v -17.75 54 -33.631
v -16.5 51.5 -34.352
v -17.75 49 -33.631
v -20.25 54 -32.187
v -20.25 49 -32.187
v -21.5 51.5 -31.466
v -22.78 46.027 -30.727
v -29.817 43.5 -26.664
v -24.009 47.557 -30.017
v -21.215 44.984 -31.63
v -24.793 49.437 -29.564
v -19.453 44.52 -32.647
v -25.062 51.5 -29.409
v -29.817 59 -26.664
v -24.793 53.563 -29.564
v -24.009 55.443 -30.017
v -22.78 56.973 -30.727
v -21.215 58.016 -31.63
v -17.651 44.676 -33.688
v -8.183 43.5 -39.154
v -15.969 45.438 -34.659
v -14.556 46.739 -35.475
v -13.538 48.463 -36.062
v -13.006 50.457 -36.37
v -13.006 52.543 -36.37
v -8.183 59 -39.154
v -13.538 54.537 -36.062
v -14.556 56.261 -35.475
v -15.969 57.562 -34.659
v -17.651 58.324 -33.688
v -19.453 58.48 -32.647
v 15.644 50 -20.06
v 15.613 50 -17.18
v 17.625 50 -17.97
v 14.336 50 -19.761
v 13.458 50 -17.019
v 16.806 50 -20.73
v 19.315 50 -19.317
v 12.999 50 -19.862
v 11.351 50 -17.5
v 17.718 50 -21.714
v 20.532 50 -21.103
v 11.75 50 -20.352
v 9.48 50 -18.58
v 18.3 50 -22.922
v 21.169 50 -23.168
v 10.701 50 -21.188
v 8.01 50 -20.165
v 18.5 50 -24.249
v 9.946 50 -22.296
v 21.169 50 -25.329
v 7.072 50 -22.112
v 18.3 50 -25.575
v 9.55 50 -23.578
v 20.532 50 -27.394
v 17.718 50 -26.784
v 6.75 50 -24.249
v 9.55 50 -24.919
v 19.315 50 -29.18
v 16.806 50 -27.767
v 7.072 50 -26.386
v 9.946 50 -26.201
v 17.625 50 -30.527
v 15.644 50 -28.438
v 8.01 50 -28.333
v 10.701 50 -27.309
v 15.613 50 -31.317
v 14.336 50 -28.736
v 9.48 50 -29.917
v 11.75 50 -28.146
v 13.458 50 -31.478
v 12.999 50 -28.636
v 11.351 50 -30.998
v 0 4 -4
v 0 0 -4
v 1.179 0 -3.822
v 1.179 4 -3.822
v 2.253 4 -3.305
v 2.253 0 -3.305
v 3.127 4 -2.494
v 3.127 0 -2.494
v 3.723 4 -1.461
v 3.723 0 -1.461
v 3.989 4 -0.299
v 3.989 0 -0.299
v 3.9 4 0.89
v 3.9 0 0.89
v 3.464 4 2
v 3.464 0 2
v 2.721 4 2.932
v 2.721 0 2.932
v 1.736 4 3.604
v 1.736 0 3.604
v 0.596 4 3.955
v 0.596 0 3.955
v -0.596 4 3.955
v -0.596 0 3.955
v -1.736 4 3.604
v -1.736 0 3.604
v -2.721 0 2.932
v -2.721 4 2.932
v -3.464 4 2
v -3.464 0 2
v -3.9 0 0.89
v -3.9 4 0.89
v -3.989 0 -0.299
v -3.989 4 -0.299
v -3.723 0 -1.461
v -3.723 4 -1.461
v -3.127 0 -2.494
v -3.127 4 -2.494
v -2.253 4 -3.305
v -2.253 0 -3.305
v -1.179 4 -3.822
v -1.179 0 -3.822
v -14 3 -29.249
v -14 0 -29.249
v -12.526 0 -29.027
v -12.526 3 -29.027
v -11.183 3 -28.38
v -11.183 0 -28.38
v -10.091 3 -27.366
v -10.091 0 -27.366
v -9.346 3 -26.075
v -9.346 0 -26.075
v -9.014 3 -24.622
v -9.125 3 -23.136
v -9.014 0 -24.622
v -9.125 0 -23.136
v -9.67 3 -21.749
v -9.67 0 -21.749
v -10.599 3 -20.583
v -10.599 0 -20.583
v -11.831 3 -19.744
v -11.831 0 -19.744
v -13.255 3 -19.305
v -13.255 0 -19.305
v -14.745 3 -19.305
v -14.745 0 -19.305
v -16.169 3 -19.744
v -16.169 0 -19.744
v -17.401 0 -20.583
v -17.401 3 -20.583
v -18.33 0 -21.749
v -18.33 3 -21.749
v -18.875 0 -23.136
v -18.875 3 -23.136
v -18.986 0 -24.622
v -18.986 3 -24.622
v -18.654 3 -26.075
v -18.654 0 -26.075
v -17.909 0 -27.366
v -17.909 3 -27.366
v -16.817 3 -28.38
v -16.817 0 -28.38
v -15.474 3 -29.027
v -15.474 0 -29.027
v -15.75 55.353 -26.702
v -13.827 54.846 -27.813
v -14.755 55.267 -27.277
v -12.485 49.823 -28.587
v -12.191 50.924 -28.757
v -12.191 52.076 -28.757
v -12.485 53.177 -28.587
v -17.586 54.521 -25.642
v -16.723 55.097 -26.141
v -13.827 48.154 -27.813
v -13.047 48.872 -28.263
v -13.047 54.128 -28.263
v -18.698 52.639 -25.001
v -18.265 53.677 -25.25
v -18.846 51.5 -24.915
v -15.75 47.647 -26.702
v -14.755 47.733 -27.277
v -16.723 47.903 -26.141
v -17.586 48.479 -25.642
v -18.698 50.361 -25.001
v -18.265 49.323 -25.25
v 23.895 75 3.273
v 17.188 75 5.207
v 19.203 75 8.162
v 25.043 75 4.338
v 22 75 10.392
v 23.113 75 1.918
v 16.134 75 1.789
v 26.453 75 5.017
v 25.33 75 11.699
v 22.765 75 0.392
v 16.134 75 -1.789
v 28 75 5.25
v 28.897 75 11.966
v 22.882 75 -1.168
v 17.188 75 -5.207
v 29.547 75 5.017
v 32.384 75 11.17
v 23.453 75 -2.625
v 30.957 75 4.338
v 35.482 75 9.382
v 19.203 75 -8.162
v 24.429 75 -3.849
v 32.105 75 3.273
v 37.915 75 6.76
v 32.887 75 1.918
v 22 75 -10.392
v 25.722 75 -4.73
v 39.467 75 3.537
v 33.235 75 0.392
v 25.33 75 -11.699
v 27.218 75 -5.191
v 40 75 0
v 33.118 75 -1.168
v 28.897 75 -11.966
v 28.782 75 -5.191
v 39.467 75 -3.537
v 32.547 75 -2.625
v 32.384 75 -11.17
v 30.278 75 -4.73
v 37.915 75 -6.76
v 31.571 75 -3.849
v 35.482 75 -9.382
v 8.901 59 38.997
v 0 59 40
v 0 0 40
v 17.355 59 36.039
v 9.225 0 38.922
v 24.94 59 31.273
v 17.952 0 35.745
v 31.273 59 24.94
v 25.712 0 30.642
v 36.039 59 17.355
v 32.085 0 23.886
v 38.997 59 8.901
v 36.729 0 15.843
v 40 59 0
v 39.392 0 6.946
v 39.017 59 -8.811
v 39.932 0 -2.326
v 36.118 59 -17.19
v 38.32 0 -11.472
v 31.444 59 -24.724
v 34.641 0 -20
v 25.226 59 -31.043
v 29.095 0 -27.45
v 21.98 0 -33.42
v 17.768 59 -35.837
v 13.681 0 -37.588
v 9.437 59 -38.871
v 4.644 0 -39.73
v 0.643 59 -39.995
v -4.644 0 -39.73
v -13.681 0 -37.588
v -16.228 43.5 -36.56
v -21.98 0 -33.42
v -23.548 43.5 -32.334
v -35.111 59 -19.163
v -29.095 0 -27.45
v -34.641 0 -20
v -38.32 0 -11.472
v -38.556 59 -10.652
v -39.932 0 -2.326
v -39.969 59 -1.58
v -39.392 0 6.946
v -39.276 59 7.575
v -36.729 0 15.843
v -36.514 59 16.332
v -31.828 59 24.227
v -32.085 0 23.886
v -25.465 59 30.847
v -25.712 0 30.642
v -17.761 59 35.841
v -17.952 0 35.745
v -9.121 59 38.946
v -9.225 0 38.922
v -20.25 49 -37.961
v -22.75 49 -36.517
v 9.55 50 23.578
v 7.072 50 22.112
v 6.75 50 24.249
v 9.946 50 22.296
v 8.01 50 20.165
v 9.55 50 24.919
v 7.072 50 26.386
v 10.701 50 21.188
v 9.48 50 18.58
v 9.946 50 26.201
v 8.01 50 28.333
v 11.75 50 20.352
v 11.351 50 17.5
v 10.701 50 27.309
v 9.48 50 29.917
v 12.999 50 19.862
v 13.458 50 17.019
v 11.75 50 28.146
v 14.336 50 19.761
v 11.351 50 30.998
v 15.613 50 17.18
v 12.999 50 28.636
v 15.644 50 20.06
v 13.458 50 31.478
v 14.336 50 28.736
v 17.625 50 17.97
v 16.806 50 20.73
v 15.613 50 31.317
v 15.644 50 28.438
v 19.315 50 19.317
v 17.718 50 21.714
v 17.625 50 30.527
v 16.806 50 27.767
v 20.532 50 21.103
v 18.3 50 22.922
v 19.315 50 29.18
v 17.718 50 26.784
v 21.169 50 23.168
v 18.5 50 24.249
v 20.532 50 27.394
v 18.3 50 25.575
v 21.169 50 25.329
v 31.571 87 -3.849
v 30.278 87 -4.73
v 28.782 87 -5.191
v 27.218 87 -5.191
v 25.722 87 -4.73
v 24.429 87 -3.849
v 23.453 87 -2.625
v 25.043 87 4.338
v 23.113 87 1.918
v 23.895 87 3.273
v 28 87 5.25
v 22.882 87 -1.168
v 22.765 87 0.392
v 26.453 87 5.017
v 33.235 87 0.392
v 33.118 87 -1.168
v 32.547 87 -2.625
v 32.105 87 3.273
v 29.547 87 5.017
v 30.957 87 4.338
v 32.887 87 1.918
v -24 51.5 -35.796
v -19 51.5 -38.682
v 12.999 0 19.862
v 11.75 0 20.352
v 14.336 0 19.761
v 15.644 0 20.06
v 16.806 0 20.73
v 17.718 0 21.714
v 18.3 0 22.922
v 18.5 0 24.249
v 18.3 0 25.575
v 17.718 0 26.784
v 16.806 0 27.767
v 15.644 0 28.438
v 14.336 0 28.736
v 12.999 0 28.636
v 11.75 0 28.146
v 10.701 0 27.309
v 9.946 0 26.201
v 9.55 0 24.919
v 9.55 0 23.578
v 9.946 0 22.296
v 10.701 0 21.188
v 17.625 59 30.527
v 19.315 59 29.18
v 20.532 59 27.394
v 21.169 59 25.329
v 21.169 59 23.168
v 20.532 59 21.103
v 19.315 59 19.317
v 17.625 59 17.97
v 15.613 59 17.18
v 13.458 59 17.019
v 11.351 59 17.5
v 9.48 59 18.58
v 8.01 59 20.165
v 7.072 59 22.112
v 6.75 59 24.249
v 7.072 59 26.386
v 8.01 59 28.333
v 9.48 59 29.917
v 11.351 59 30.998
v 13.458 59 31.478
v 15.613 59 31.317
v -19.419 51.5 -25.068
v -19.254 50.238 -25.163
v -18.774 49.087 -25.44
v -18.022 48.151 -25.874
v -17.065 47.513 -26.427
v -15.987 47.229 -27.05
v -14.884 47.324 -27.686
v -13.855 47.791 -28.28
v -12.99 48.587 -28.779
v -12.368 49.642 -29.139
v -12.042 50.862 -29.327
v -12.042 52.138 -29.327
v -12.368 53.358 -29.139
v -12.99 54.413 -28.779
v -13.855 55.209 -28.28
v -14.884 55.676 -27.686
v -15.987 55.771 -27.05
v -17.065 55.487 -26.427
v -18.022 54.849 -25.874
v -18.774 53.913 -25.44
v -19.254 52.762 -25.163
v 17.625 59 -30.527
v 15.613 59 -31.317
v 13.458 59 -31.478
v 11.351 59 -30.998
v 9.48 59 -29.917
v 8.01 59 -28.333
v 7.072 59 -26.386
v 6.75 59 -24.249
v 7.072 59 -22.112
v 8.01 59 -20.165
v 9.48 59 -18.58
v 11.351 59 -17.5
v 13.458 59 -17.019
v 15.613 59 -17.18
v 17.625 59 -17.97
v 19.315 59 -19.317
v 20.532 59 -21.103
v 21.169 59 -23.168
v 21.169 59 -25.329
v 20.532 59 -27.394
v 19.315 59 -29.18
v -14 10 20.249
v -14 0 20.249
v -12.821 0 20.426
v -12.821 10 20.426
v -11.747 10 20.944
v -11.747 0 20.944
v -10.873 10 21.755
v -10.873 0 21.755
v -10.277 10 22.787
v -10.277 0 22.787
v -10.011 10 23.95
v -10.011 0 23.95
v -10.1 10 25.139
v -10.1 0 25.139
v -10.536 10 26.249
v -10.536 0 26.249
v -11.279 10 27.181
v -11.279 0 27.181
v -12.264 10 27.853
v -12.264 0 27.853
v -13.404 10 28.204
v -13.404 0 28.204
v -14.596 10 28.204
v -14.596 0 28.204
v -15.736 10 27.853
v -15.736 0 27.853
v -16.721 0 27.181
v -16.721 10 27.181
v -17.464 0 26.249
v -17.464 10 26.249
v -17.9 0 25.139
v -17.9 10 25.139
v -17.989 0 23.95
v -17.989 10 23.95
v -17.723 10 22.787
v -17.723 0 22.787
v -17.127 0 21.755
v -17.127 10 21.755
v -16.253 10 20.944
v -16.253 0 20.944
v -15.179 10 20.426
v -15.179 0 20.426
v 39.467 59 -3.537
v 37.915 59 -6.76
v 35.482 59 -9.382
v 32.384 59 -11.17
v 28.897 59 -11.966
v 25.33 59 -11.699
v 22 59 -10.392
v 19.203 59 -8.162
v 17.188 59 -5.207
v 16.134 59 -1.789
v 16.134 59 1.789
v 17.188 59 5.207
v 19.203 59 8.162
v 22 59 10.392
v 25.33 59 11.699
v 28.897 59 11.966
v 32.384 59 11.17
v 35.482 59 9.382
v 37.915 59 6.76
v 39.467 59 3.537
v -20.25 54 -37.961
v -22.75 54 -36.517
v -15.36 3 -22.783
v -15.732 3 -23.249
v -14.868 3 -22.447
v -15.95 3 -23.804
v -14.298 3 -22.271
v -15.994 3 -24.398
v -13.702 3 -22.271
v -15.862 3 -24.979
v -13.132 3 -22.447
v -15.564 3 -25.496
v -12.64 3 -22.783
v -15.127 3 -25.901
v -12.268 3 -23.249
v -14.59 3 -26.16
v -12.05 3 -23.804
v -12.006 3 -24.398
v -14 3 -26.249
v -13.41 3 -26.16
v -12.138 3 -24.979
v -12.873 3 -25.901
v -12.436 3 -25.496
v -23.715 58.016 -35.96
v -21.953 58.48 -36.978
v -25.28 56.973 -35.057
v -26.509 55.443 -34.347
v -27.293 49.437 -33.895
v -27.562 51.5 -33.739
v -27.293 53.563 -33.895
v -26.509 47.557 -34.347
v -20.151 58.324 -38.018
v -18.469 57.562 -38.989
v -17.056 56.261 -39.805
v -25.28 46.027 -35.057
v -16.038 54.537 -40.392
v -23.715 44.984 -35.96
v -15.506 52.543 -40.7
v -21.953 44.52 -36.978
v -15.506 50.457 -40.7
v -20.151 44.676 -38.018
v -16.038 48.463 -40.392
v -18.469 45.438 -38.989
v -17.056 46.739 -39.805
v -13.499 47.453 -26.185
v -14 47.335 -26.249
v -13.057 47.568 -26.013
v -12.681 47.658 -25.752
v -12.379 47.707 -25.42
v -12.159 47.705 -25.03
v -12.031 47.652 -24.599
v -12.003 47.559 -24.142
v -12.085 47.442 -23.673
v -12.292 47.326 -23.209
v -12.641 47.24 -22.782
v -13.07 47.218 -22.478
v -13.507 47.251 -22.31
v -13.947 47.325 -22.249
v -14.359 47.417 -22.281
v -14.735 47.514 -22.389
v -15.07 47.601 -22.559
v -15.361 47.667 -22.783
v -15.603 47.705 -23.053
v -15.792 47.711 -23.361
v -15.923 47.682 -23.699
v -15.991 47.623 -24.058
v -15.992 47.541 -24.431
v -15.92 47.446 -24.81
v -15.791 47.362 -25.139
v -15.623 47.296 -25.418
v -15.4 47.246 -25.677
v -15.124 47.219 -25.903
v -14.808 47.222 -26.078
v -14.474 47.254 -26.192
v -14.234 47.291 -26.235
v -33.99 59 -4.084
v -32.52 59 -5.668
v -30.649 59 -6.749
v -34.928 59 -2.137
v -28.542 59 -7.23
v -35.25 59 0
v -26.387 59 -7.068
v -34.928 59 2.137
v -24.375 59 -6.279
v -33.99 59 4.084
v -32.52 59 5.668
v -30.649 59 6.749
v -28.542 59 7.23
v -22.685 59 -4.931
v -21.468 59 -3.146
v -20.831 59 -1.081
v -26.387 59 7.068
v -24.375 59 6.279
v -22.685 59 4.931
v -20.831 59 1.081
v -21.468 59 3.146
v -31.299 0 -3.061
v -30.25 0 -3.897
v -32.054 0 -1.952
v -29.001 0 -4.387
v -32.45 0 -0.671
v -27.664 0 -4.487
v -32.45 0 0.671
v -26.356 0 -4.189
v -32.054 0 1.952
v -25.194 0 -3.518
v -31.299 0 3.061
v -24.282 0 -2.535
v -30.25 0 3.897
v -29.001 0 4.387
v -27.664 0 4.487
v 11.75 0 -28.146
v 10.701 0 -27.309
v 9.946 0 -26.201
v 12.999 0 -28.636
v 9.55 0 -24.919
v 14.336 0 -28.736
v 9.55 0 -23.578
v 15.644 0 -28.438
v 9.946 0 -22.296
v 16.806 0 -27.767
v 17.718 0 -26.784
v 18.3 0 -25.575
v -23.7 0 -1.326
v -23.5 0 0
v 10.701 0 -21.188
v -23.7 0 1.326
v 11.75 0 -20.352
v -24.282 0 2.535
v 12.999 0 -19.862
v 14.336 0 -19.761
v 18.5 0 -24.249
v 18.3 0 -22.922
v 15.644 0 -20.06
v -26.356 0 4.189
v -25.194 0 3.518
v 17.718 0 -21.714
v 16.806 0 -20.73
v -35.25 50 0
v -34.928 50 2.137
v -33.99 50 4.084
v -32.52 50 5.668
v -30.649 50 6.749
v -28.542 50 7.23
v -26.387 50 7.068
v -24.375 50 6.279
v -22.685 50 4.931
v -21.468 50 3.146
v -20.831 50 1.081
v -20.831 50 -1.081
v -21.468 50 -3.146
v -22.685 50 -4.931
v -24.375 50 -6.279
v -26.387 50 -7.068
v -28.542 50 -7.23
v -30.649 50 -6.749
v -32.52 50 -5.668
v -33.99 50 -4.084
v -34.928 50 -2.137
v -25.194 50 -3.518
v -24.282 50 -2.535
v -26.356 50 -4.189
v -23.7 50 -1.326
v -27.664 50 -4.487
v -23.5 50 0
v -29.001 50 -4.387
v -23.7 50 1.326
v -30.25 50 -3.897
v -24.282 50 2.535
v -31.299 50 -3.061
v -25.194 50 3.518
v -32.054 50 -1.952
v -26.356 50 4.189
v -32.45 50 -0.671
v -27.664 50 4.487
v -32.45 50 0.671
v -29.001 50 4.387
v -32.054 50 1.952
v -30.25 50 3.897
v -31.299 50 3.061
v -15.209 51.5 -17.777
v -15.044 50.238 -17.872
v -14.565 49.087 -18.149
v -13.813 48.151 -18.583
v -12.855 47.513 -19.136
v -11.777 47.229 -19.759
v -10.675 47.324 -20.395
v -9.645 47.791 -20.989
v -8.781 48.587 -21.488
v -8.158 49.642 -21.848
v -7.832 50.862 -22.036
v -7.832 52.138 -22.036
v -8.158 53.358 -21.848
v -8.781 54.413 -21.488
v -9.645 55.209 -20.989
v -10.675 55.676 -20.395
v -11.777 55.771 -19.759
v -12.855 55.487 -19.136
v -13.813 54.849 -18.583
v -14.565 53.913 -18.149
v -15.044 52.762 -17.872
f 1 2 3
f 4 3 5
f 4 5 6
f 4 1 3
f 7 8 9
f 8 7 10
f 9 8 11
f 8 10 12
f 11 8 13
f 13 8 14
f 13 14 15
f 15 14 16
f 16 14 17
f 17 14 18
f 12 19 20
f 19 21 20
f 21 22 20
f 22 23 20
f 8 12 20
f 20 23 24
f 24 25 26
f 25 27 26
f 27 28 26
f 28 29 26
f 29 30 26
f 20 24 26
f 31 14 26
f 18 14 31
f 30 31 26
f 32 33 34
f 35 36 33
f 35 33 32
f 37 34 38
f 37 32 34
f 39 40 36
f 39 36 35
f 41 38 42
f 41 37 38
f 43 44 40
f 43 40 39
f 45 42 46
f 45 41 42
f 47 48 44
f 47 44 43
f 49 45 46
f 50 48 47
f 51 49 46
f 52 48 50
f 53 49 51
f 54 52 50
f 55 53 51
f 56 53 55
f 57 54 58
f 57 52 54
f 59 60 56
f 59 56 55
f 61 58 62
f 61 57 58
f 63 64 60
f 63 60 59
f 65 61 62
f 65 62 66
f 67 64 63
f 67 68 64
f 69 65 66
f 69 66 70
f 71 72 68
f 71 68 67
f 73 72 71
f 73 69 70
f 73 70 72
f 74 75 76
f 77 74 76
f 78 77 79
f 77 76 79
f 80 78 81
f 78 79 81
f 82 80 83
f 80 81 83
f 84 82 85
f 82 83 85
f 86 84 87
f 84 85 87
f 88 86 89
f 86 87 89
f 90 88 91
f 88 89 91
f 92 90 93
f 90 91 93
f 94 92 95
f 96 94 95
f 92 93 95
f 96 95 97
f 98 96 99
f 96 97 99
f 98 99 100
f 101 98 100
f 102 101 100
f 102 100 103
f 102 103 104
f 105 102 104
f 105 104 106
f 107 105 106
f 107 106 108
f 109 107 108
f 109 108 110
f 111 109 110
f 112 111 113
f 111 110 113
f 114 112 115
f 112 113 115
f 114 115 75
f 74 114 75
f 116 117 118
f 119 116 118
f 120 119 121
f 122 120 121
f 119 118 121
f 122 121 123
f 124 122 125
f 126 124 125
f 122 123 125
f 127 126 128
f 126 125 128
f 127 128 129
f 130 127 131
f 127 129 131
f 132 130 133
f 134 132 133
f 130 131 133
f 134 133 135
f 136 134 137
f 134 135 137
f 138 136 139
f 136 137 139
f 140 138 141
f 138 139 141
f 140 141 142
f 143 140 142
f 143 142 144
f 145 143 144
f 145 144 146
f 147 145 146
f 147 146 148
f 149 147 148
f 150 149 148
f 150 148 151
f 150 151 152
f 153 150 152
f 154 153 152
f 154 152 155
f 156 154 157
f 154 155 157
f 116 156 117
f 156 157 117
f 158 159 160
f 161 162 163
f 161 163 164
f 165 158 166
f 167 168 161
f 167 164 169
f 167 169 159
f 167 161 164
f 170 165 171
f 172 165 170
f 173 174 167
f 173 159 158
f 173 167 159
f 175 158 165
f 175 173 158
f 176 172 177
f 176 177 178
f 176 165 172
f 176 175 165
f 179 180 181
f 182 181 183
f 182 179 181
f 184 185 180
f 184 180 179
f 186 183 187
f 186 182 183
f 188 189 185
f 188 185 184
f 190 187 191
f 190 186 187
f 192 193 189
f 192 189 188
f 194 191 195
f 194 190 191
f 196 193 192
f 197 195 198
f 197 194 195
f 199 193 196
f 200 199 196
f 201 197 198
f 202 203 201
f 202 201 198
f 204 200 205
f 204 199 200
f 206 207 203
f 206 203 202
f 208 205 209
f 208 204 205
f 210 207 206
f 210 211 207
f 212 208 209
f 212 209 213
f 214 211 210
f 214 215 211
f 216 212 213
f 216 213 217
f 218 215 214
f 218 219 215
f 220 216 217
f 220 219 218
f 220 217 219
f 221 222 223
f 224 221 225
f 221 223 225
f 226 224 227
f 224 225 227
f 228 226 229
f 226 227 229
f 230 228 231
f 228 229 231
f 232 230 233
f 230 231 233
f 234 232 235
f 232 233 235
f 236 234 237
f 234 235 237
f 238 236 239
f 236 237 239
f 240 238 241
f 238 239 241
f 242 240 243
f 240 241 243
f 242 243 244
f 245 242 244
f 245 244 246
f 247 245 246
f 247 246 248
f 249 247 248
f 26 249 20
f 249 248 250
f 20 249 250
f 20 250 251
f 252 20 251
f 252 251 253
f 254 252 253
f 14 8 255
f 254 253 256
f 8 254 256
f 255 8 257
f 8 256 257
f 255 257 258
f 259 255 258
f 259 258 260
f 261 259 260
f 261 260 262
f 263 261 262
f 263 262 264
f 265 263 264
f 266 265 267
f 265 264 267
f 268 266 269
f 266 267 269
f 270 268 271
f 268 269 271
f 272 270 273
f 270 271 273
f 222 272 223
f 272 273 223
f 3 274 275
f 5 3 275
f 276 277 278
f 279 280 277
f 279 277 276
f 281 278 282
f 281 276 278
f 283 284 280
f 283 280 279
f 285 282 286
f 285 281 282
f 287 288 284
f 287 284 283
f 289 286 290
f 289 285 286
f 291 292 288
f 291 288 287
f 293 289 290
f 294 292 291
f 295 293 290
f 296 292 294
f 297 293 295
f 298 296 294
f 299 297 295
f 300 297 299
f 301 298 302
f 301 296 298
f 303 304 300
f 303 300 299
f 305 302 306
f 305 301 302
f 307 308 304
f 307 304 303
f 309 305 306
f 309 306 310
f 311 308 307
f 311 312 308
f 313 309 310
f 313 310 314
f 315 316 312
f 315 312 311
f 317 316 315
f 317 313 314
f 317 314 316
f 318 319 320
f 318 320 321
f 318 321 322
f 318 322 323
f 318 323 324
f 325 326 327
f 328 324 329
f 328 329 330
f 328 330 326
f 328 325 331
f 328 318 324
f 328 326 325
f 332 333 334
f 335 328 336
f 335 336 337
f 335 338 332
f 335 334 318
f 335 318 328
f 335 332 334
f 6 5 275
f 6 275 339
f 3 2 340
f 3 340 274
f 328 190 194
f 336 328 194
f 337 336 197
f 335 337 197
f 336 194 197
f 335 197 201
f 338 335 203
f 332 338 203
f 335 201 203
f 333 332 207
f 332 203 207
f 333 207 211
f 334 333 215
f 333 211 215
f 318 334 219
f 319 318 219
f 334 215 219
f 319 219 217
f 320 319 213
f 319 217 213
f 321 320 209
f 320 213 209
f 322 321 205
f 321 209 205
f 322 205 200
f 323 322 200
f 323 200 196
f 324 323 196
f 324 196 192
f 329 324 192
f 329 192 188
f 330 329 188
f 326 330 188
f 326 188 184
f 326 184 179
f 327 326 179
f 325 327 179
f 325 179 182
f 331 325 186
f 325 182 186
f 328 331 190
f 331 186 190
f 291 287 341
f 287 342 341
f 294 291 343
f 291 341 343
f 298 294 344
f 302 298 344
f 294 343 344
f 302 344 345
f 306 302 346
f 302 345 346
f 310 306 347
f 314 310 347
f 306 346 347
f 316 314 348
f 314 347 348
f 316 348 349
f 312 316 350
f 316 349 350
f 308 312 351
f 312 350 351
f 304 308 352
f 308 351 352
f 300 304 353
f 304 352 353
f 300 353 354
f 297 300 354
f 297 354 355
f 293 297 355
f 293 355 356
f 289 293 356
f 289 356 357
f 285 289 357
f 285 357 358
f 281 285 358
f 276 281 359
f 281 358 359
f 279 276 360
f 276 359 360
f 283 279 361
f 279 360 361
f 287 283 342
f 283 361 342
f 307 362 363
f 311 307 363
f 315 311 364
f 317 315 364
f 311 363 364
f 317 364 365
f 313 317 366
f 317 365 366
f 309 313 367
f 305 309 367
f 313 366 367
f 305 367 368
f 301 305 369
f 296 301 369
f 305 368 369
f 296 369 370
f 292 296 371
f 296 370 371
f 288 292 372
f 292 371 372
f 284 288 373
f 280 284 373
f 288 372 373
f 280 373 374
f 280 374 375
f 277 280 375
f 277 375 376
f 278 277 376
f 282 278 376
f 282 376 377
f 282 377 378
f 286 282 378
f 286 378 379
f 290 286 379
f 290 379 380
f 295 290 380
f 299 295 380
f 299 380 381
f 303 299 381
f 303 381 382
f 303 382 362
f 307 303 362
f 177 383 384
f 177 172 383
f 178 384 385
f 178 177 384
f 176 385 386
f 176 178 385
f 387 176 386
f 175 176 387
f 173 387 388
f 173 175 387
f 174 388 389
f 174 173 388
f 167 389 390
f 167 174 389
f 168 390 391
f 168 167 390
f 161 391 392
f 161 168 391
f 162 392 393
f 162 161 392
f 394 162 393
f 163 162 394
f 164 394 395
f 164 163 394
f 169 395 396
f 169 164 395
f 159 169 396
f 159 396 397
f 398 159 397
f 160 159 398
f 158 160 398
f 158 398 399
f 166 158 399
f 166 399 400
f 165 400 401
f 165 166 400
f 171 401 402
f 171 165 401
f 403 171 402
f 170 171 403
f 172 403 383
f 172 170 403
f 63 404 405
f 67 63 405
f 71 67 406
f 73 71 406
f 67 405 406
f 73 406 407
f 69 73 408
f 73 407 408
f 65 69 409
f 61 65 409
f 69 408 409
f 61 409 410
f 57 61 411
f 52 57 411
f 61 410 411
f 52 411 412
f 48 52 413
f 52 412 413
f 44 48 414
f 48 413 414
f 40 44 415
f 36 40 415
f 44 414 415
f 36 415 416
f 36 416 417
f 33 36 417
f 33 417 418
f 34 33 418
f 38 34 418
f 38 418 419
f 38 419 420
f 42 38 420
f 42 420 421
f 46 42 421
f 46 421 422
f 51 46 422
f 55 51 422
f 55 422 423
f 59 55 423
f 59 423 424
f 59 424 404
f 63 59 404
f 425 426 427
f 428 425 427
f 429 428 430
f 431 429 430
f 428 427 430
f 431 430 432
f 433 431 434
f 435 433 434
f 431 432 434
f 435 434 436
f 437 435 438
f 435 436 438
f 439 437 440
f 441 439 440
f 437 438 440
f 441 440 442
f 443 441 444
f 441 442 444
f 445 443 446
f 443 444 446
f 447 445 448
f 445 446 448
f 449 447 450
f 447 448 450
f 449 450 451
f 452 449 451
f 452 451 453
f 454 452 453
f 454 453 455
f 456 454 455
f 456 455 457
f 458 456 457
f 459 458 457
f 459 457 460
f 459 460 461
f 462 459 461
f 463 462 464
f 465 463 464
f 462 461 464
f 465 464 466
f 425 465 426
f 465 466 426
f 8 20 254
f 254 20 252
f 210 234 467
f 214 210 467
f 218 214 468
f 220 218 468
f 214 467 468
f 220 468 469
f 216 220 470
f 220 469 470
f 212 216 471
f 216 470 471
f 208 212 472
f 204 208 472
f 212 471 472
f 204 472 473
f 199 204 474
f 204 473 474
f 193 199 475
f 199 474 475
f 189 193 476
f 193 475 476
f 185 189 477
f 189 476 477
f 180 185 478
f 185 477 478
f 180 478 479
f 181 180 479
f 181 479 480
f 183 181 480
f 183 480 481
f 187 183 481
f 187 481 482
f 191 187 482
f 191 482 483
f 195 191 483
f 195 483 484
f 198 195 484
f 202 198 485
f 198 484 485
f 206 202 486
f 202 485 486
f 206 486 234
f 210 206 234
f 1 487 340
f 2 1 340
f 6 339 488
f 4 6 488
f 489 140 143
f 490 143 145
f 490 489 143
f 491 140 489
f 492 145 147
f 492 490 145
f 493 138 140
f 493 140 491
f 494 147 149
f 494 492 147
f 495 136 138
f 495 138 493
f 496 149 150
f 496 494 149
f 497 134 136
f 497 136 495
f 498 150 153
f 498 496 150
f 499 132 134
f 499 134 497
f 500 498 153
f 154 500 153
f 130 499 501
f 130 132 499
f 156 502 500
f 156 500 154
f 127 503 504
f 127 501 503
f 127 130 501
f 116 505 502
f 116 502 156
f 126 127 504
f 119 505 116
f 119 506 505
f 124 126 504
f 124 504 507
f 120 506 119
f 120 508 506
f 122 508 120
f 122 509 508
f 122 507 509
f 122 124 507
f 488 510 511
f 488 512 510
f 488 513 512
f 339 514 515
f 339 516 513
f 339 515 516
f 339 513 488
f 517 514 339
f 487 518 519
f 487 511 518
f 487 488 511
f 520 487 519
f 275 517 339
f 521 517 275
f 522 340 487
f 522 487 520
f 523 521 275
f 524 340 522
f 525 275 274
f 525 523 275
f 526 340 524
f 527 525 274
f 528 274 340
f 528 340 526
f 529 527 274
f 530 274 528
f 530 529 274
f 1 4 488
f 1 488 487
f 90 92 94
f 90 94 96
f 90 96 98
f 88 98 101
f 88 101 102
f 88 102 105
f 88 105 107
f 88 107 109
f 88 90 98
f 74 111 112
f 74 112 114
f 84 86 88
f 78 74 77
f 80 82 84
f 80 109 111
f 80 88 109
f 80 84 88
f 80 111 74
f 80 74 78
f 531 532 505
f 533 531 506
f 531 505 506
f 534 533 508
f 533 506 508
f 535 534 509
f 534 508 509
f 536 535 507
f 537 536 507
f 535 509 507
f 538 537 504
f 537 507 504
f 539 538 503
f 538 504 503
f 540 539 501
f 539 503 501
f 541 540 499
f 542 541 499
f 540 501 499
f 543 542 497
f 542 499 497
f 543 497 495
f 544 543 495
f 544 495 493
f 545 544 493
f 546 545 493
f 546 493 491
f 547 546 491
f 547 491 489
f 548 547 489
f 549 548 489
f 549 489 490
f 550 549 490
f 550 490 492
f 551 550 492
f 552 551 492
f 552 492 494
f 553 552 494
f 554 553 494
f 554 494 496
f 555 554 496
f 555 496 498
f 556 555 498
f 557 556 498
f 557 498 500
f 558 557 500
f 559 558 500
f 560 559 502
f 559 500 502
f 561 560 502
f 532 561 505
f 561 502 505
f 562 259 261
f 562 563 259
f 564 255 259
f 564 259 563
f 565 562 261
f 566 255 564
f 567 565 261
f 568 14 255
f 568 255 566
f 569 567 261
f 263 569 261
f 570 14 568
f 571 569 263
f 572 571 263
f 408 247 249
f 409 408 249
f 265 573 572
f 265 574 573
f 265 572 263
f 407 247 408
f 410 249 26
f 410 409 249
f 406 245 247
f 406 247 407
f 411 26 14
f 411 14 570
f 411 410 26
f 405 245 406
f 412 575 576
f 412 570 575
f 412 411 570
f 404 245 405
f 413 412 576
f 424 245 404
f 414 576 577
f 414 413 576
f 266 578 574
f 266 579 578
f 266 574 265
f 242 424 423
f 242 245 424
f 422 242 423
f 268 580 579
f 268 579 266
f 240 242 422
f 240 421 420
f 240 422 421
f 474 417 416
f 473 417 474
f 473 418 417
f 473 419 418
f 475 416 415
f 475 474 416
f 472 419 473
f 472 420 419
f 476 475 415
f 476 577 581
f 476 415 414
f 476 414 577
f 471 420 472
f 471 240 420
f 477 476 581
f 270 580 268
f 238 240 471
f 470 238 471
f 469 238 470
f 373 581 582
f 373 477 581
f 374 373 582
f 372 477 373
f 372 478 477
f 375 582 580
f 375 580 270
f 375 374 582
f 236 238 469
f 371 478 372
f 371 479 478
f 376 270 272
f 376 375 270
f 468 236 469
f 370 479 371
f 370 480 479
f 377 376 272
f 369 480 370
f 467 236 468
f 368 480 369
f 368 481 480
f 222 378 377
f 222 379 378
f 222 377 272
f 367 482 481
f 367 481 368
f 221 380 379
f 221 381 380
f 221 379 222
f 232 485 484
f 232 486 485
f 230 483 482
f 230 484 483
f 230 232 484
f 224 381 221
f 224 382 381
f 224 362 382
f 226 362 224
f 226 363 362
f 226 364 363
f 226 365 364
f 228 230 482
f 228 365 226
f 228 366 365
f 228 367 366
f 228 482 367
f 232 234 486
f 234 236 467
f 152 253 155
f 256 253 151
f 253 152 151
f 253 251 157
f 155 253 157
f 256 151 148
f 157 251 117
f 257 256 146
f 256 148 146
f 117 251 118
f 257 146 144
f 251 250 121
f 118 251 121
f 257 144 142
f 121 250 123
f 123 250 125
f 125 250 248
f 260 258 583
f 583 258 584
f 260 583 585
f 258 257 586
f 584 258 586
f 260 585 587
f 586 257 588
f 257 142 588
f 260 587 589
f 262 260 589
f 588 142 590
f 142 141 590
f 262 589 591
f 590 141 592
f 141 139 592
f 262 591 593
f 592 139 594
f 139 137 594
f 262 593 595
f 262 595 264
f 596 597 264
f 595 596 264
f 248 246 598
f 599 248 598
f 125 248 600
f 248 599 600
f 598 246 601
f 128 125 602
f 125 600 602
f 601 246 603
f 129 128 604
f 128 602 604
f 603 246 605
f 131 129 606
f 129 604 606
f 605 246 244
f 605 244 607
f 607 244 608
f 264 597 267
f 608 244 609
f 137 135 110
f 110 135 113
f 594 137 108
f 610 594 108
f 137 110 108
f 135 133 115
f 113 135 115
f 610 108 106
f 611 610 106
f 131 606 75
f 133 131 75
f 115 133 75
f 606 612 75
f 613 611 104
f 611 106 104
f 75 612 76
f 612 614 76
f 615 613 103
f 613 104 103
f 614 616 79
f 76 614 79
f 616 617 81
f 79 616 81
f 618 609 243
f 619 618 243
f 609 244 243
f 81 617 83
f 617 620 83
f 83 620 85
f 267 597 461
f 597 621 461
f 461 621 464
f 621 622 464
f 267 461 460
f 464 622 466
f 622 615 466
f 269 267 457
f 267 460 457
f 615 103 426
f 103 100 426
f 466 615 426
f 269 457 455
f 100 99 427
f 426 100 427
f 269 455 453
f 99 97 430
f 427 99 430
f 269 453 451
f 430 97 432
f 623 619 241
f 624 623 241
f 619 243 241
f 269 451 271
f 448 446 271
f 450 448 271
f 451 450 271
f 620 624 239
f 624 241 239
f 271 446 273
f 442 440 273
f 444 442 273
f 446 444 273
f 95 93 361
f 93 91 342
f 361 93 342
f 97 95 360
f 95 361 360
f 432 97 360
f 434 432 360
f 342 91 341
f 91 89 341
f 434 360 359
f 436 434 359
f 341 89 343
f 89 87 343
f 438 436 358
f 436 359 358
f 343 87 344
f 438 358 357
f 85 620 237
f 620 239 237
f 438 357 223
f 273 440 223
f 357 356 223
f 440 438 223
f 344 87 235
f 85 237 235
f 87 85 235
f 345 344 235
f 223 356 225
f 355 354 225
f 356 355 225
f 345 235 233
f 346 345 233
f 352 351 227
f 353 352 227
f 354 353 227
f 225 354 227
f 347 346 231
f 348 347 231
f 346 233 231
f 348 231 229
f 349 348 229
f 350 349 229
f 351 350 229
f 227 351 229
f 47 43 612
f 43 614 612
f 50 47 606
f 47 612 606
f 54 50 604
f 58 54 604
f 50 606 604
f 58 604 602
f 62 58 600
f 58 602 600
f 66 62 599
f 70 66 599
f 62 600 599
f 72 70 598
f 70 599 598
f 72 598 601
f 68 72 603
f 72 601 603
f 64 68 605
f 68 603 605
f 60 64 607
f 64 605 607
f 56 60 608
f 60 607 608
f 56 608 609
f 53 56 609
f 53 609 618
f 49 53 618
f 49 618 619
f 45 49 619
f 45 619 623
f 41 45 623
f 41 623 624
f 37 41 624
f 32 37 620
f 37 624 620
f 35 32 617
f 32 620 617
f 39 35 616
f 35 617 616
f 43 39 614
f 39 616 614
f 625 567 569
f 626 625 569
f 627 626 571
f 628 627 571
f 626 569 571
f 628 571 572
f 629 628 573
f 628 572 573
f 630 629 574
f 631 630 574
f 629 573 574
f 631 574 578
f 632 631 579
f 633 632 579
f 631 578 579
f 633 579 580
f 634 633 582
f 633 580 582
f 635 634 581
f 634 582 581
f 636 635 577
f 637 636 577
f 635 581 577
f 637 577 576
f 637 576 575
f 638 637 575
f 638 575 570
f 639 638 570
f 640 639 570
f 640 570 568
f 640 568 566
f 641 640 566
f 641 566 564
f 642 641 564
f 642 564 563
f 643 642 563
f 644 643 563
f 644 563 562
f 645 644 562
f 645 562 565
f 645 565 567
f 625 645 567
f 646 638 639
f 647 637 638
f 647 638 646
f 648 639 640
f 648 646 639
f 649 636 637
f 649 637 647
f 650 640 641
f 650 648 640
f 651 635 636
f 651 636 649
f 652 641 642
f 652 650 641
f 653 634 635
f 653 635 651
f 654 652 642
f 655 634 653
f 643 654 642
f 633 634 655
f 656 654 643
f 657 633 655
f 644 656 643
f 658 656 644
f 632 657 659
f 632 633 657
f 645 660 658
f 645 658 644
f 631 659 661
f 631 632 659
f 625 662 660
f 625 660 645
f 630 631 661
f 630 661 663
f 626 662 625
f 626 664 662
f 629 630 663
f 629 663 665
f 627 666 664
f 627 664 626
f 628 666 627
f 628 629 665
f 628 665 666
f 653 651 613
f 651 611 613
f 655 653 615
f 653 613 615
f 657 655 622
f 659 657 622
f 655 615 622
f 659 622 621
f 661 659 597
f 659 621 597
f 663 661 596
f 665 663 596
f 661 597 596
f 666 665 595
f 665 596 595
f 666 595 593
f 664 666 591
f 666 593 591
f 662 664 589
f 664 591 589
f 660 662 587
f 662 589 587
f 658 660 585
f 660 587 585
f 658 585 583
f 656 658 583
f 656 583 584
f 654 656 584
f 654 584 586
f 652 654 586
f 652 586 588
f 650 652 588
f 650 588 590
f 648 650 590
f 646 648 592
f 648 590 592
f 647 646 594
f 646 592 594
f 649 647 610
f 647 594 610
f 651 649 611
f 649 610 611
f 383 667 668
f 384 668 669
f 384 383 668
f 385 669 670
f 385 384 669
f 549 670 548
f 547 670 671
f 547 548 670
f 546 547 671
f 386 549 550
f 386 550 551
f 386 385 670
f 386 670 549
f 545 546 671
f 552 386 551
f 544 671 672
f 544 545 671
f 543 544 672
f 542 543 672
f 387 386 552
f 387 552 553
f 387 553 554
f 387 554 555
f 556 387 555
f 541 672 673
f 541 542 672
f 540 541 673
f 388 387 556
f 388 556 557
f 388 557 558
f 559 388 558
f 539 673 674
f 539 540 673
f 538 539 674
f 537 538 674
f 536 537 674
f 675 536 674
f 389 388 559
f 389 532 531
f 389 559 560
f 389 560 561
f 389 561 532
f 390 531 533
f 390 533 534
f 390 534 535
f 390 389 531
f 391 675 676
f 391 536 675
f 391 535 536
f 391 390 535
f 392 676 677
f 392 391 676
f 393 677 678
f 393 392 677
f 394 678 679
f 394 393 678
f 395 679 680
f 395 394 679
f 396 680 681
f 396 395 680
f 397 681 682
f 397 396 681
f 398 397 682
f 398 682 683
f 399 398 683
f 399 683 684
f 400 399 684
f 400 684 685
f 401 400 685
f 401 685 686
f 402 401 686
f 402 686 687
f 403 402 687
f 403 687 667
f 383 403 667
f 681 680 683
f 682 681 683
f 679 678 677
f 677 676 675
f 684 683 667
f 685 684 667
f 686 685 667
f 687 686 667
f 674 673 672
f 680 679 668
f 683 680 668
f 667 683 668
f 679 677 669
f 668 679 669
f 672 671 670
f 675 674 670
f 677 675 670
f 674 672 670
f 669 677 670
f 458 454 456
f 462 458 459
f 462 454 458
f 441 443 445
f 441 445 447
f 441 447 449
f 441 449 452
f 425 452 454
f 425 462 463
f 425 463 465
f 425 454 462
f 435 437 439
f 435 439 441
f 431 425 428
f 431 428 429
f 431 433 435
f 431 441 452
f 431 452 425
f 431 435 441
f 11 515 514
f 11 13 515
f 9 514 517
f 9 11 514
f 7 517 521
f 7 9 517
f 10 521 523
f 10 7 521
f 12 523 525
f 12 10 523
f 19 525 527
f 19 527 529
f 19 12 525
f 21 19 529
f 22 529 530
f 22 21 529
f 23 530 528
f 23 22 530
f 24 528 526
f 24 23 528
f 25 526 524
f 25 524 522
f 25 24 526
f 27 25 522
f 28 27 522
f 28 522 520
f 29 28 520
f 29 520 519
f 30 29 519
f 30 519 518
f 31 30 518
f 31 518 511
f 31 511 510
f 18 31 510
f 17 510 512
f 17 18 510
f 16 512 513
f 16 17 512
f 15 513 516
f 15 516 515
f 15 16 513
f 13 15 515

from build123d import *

# Parameters (mm, degrees)
SKETCH1_R          = 40
EXTRUDE1_DEPTH     = 59
SKETCH11_R         = 12
EXTRUDE2_DEPTH     = 16
SKETCH12_R         = 5.25
EXTRUDE3_DEPTH     = 12
HOLE1_D            = 9
HOLE1_DEPTH        = 59.001
HOLE1_CBORE_D      = 14.5
HOLE1_CBORE_DEPTH  = 9
CIRPATTERN1_COUNT  = 3
SKETCH5_R          = 4
CUT_EXTRUDE1_DEPTH = 4
SKETCH13_R         = 4
CUT_EXTRUDE5_DEPTH = 10
SKETCH6_R          = 5
CUT_EXTRUDE2_DEPTH = 3
SKETCH7_R          = 2
CUT_EXTRUDE3_DEPTH = 48.5
CUT_EXTRUDE6_DEPTH = 15.5
SKETCH8_W          = 15
SKETCH8_H          = 4.283
CUT_EXTRUDE4_DEPTH = 5


with BuildPart() as part:
    # Sketch1 → Extrude1 (new body)
    with BuildSketch(Plane(origin=(0, 0, 0), x_dir=(1, 0, 0), z_dir=(0, 1, 0))):
        with Locations(Location((0, 0, 0), (0, 0, 270))):  # turned: the seam where the file's is
            Circle(SKETCH1_R)
    extrude(amount=EXTRUDE1_DEPTH)

    # Sketch11 → Extrude2 (add)
    with BuildSketch(Plane(origin=(0, 59, 0), x_dir=(1, 0, 0), z_dir=(0, 1, 0))):
        with Locations((28, 0)):
            Circle(SKETCH11_R)
    extrude(amount=EXTRUDE2_DEPTH)

    # Sketch12 → Extrude3 (add)
    with BuildSketch(Plane(origin=(0, 75, 0), x_dir=(1, 0, 0), z_dir=(0, 1, 0))):
        with Locations(Location((28, 0, 0), (0, 0, 270))):  # turned: the seam where the file's is
            Circle(SKETCH12_R)
    extrude(amount=EXTRUDE3_DEPTH)

    # Hole1
    with Locations(Plane(origin=(0, 59, 0), x_dir=(-1, 0, 0), z_dir=(0, 1, 0))):
        with Locations((28, 0)):
            hole1 = CounterBoreHole(HOLE1_D / 2, HOLE1_CBORE_D / 2, HOLE1_CBORE_DEPTH, depth=HOLE1_DEPTH)

    # CirPattern1: Hole1 ×3 about axis
    cirpattern1_axis = Axis((0, 0, 0), (0, 1, 0))
    for i in range(1, CIRPATTERN1_COUNT):
        add(hole1.rotate(cirpattern1_axis, i * 360 / CIRPATTERN1_COUNT), mode=Mode.SUBTRACT)

    # Sketch5 → Cut-Extrude1 (cut)
    with BuildSketch(Plane.XZ):
        with Locations(Location((0, 0, 0), (0, 0, 270))):  # turned: the seam where the file's is
            Circle(SKETCH5_R)
    extrude(amount=-CUT_EXTRUDE1_DEPTH, mode=Mode.SUBTRACT)

    # Sketch13 → Cut-Extrude5 (cut)
    with BuildSketch(Plane.XZ):
        with Locations(Location((-14, 24.248711306, 0), (0, 0, 270))):  # turned: the seam where the file's is
            Circle(SKETCH13_R)
    extrude(amount=-CUT_EXTRUDE5_DEPTH, mode=Mode.SUBTRACT)

    # Sketch6 → Cut-Extrude2 (cut)
    with BuildSketch(Plane.XZ):
        with Locations(Location((-14, -24.248711306, 0), (0, 0, 270))):  # turned: the seam where the file's is
            Circle(SKETCH6_R)
    extrude(amount=-CUT_EXTRUDE2_DEPTH, mode=Mode.SUBTRACT)

    # Sketch7 → Cut-Extrude3 (cut)
    with BuildSketch(Plane.XZ.offset(-3)):
        with Locations(Location((-14, -24.248711306, 0), (0, 0, 270))):  # turned: the seam where the file's is
            Circle(SKETCH7_R)
    extrude(amount=-CUT_EXTRUDE3_DEPTH, mode=Mode.SUBTRACT)

    # Sketch14 → Cut-Extrude6 (cut)
    with BuildSketch(Plane(origin=(0, 59, 0), x_dir=(1, 0, 0), z_dir=(0, 1, 0))):
        with BuildLine():
            Line((-29.816653826, 26.663967345), (-8.183346174, 39.153963342))
            ThreePointArc((-8.183346174, 39.153963342), (-20, 34.641016151), (-29.816653826, 26.663967345))
        make_face()
    extrude(amount=-CUT_EXTRUDE6_DEPTH, mode=Mode.SUBTRACT)

    # Sketch8 → Cut-Revolve1 (revolve, cut)
    with BuildSketch(Plane(origin=(0, 0, 0), x_dir=(-0.5, 0, -0.866025404), z_dir=(0.866025404, 0, -0.5)), mode=Mode.PRIVATE) as cut_revolve1_sk:
        with Locations((30.5, 49.3585)):
            Rectangle(SKETCH8_W, SKETCH8_H)
    revolve(cut_revolve1_sk.sketch.rotate(Axis((-25.792798991, 51.5, -44.674438322), (0.5, 0, 0.866025404)), 270), axis=Axis((-25.792798991, 51.5, -44.674438322), (0.5, 0, 0.866025404)), mode=Mode.SUBTRACT)  # turned: the seam where the file's is

    # Sketch9 → Revolve2 (revolve)
    with BuildSketch(Plane(origin=(0, 0, 0), x_dir=(-0.5, 0, -0.866025404), z_dir=(0.866025404, 0, -0.5)), mode=Mode.PRIVATE) as revolve2_sk:
        Polygon((38, 44.5), (38, 47.217), (31.419, 47.217), (31, 47.636), (31, 51.5), (43, 51.5), (43, 44.5), align=None)
    revolve(revolve2_sk.sketch.rotate(Axis((-23.293952485, 51.5, -40.346309212), (0.5, 0, 0.866025404)), 270), axis=Axis((-23.293952485, 51.5, -40.346309212), (0.5, 0, 0.866025404)))  # turned: the seam where the file's is

    # Sketch10 → Cut-Extrude4 (cut)
    with BuildSketch(Plane(origin=(-21.5, 0, -37.239092363), x_dir=(-0.866025404, 0, 0.5), z_dir=(-0.5, 0, -0.866025404))):
        Polygon((2.886751346, 51.5), (1.443375673, 54), (-1.443375673, 54), (-2.886751346, 51.5), (-1.443375673, 49), (1.443375673, 49), align=None)
    extrude(amount=-CUT_EXTRUDE4_DEPTH, mode=Mode.SUBTRACT)


solid = part.part
